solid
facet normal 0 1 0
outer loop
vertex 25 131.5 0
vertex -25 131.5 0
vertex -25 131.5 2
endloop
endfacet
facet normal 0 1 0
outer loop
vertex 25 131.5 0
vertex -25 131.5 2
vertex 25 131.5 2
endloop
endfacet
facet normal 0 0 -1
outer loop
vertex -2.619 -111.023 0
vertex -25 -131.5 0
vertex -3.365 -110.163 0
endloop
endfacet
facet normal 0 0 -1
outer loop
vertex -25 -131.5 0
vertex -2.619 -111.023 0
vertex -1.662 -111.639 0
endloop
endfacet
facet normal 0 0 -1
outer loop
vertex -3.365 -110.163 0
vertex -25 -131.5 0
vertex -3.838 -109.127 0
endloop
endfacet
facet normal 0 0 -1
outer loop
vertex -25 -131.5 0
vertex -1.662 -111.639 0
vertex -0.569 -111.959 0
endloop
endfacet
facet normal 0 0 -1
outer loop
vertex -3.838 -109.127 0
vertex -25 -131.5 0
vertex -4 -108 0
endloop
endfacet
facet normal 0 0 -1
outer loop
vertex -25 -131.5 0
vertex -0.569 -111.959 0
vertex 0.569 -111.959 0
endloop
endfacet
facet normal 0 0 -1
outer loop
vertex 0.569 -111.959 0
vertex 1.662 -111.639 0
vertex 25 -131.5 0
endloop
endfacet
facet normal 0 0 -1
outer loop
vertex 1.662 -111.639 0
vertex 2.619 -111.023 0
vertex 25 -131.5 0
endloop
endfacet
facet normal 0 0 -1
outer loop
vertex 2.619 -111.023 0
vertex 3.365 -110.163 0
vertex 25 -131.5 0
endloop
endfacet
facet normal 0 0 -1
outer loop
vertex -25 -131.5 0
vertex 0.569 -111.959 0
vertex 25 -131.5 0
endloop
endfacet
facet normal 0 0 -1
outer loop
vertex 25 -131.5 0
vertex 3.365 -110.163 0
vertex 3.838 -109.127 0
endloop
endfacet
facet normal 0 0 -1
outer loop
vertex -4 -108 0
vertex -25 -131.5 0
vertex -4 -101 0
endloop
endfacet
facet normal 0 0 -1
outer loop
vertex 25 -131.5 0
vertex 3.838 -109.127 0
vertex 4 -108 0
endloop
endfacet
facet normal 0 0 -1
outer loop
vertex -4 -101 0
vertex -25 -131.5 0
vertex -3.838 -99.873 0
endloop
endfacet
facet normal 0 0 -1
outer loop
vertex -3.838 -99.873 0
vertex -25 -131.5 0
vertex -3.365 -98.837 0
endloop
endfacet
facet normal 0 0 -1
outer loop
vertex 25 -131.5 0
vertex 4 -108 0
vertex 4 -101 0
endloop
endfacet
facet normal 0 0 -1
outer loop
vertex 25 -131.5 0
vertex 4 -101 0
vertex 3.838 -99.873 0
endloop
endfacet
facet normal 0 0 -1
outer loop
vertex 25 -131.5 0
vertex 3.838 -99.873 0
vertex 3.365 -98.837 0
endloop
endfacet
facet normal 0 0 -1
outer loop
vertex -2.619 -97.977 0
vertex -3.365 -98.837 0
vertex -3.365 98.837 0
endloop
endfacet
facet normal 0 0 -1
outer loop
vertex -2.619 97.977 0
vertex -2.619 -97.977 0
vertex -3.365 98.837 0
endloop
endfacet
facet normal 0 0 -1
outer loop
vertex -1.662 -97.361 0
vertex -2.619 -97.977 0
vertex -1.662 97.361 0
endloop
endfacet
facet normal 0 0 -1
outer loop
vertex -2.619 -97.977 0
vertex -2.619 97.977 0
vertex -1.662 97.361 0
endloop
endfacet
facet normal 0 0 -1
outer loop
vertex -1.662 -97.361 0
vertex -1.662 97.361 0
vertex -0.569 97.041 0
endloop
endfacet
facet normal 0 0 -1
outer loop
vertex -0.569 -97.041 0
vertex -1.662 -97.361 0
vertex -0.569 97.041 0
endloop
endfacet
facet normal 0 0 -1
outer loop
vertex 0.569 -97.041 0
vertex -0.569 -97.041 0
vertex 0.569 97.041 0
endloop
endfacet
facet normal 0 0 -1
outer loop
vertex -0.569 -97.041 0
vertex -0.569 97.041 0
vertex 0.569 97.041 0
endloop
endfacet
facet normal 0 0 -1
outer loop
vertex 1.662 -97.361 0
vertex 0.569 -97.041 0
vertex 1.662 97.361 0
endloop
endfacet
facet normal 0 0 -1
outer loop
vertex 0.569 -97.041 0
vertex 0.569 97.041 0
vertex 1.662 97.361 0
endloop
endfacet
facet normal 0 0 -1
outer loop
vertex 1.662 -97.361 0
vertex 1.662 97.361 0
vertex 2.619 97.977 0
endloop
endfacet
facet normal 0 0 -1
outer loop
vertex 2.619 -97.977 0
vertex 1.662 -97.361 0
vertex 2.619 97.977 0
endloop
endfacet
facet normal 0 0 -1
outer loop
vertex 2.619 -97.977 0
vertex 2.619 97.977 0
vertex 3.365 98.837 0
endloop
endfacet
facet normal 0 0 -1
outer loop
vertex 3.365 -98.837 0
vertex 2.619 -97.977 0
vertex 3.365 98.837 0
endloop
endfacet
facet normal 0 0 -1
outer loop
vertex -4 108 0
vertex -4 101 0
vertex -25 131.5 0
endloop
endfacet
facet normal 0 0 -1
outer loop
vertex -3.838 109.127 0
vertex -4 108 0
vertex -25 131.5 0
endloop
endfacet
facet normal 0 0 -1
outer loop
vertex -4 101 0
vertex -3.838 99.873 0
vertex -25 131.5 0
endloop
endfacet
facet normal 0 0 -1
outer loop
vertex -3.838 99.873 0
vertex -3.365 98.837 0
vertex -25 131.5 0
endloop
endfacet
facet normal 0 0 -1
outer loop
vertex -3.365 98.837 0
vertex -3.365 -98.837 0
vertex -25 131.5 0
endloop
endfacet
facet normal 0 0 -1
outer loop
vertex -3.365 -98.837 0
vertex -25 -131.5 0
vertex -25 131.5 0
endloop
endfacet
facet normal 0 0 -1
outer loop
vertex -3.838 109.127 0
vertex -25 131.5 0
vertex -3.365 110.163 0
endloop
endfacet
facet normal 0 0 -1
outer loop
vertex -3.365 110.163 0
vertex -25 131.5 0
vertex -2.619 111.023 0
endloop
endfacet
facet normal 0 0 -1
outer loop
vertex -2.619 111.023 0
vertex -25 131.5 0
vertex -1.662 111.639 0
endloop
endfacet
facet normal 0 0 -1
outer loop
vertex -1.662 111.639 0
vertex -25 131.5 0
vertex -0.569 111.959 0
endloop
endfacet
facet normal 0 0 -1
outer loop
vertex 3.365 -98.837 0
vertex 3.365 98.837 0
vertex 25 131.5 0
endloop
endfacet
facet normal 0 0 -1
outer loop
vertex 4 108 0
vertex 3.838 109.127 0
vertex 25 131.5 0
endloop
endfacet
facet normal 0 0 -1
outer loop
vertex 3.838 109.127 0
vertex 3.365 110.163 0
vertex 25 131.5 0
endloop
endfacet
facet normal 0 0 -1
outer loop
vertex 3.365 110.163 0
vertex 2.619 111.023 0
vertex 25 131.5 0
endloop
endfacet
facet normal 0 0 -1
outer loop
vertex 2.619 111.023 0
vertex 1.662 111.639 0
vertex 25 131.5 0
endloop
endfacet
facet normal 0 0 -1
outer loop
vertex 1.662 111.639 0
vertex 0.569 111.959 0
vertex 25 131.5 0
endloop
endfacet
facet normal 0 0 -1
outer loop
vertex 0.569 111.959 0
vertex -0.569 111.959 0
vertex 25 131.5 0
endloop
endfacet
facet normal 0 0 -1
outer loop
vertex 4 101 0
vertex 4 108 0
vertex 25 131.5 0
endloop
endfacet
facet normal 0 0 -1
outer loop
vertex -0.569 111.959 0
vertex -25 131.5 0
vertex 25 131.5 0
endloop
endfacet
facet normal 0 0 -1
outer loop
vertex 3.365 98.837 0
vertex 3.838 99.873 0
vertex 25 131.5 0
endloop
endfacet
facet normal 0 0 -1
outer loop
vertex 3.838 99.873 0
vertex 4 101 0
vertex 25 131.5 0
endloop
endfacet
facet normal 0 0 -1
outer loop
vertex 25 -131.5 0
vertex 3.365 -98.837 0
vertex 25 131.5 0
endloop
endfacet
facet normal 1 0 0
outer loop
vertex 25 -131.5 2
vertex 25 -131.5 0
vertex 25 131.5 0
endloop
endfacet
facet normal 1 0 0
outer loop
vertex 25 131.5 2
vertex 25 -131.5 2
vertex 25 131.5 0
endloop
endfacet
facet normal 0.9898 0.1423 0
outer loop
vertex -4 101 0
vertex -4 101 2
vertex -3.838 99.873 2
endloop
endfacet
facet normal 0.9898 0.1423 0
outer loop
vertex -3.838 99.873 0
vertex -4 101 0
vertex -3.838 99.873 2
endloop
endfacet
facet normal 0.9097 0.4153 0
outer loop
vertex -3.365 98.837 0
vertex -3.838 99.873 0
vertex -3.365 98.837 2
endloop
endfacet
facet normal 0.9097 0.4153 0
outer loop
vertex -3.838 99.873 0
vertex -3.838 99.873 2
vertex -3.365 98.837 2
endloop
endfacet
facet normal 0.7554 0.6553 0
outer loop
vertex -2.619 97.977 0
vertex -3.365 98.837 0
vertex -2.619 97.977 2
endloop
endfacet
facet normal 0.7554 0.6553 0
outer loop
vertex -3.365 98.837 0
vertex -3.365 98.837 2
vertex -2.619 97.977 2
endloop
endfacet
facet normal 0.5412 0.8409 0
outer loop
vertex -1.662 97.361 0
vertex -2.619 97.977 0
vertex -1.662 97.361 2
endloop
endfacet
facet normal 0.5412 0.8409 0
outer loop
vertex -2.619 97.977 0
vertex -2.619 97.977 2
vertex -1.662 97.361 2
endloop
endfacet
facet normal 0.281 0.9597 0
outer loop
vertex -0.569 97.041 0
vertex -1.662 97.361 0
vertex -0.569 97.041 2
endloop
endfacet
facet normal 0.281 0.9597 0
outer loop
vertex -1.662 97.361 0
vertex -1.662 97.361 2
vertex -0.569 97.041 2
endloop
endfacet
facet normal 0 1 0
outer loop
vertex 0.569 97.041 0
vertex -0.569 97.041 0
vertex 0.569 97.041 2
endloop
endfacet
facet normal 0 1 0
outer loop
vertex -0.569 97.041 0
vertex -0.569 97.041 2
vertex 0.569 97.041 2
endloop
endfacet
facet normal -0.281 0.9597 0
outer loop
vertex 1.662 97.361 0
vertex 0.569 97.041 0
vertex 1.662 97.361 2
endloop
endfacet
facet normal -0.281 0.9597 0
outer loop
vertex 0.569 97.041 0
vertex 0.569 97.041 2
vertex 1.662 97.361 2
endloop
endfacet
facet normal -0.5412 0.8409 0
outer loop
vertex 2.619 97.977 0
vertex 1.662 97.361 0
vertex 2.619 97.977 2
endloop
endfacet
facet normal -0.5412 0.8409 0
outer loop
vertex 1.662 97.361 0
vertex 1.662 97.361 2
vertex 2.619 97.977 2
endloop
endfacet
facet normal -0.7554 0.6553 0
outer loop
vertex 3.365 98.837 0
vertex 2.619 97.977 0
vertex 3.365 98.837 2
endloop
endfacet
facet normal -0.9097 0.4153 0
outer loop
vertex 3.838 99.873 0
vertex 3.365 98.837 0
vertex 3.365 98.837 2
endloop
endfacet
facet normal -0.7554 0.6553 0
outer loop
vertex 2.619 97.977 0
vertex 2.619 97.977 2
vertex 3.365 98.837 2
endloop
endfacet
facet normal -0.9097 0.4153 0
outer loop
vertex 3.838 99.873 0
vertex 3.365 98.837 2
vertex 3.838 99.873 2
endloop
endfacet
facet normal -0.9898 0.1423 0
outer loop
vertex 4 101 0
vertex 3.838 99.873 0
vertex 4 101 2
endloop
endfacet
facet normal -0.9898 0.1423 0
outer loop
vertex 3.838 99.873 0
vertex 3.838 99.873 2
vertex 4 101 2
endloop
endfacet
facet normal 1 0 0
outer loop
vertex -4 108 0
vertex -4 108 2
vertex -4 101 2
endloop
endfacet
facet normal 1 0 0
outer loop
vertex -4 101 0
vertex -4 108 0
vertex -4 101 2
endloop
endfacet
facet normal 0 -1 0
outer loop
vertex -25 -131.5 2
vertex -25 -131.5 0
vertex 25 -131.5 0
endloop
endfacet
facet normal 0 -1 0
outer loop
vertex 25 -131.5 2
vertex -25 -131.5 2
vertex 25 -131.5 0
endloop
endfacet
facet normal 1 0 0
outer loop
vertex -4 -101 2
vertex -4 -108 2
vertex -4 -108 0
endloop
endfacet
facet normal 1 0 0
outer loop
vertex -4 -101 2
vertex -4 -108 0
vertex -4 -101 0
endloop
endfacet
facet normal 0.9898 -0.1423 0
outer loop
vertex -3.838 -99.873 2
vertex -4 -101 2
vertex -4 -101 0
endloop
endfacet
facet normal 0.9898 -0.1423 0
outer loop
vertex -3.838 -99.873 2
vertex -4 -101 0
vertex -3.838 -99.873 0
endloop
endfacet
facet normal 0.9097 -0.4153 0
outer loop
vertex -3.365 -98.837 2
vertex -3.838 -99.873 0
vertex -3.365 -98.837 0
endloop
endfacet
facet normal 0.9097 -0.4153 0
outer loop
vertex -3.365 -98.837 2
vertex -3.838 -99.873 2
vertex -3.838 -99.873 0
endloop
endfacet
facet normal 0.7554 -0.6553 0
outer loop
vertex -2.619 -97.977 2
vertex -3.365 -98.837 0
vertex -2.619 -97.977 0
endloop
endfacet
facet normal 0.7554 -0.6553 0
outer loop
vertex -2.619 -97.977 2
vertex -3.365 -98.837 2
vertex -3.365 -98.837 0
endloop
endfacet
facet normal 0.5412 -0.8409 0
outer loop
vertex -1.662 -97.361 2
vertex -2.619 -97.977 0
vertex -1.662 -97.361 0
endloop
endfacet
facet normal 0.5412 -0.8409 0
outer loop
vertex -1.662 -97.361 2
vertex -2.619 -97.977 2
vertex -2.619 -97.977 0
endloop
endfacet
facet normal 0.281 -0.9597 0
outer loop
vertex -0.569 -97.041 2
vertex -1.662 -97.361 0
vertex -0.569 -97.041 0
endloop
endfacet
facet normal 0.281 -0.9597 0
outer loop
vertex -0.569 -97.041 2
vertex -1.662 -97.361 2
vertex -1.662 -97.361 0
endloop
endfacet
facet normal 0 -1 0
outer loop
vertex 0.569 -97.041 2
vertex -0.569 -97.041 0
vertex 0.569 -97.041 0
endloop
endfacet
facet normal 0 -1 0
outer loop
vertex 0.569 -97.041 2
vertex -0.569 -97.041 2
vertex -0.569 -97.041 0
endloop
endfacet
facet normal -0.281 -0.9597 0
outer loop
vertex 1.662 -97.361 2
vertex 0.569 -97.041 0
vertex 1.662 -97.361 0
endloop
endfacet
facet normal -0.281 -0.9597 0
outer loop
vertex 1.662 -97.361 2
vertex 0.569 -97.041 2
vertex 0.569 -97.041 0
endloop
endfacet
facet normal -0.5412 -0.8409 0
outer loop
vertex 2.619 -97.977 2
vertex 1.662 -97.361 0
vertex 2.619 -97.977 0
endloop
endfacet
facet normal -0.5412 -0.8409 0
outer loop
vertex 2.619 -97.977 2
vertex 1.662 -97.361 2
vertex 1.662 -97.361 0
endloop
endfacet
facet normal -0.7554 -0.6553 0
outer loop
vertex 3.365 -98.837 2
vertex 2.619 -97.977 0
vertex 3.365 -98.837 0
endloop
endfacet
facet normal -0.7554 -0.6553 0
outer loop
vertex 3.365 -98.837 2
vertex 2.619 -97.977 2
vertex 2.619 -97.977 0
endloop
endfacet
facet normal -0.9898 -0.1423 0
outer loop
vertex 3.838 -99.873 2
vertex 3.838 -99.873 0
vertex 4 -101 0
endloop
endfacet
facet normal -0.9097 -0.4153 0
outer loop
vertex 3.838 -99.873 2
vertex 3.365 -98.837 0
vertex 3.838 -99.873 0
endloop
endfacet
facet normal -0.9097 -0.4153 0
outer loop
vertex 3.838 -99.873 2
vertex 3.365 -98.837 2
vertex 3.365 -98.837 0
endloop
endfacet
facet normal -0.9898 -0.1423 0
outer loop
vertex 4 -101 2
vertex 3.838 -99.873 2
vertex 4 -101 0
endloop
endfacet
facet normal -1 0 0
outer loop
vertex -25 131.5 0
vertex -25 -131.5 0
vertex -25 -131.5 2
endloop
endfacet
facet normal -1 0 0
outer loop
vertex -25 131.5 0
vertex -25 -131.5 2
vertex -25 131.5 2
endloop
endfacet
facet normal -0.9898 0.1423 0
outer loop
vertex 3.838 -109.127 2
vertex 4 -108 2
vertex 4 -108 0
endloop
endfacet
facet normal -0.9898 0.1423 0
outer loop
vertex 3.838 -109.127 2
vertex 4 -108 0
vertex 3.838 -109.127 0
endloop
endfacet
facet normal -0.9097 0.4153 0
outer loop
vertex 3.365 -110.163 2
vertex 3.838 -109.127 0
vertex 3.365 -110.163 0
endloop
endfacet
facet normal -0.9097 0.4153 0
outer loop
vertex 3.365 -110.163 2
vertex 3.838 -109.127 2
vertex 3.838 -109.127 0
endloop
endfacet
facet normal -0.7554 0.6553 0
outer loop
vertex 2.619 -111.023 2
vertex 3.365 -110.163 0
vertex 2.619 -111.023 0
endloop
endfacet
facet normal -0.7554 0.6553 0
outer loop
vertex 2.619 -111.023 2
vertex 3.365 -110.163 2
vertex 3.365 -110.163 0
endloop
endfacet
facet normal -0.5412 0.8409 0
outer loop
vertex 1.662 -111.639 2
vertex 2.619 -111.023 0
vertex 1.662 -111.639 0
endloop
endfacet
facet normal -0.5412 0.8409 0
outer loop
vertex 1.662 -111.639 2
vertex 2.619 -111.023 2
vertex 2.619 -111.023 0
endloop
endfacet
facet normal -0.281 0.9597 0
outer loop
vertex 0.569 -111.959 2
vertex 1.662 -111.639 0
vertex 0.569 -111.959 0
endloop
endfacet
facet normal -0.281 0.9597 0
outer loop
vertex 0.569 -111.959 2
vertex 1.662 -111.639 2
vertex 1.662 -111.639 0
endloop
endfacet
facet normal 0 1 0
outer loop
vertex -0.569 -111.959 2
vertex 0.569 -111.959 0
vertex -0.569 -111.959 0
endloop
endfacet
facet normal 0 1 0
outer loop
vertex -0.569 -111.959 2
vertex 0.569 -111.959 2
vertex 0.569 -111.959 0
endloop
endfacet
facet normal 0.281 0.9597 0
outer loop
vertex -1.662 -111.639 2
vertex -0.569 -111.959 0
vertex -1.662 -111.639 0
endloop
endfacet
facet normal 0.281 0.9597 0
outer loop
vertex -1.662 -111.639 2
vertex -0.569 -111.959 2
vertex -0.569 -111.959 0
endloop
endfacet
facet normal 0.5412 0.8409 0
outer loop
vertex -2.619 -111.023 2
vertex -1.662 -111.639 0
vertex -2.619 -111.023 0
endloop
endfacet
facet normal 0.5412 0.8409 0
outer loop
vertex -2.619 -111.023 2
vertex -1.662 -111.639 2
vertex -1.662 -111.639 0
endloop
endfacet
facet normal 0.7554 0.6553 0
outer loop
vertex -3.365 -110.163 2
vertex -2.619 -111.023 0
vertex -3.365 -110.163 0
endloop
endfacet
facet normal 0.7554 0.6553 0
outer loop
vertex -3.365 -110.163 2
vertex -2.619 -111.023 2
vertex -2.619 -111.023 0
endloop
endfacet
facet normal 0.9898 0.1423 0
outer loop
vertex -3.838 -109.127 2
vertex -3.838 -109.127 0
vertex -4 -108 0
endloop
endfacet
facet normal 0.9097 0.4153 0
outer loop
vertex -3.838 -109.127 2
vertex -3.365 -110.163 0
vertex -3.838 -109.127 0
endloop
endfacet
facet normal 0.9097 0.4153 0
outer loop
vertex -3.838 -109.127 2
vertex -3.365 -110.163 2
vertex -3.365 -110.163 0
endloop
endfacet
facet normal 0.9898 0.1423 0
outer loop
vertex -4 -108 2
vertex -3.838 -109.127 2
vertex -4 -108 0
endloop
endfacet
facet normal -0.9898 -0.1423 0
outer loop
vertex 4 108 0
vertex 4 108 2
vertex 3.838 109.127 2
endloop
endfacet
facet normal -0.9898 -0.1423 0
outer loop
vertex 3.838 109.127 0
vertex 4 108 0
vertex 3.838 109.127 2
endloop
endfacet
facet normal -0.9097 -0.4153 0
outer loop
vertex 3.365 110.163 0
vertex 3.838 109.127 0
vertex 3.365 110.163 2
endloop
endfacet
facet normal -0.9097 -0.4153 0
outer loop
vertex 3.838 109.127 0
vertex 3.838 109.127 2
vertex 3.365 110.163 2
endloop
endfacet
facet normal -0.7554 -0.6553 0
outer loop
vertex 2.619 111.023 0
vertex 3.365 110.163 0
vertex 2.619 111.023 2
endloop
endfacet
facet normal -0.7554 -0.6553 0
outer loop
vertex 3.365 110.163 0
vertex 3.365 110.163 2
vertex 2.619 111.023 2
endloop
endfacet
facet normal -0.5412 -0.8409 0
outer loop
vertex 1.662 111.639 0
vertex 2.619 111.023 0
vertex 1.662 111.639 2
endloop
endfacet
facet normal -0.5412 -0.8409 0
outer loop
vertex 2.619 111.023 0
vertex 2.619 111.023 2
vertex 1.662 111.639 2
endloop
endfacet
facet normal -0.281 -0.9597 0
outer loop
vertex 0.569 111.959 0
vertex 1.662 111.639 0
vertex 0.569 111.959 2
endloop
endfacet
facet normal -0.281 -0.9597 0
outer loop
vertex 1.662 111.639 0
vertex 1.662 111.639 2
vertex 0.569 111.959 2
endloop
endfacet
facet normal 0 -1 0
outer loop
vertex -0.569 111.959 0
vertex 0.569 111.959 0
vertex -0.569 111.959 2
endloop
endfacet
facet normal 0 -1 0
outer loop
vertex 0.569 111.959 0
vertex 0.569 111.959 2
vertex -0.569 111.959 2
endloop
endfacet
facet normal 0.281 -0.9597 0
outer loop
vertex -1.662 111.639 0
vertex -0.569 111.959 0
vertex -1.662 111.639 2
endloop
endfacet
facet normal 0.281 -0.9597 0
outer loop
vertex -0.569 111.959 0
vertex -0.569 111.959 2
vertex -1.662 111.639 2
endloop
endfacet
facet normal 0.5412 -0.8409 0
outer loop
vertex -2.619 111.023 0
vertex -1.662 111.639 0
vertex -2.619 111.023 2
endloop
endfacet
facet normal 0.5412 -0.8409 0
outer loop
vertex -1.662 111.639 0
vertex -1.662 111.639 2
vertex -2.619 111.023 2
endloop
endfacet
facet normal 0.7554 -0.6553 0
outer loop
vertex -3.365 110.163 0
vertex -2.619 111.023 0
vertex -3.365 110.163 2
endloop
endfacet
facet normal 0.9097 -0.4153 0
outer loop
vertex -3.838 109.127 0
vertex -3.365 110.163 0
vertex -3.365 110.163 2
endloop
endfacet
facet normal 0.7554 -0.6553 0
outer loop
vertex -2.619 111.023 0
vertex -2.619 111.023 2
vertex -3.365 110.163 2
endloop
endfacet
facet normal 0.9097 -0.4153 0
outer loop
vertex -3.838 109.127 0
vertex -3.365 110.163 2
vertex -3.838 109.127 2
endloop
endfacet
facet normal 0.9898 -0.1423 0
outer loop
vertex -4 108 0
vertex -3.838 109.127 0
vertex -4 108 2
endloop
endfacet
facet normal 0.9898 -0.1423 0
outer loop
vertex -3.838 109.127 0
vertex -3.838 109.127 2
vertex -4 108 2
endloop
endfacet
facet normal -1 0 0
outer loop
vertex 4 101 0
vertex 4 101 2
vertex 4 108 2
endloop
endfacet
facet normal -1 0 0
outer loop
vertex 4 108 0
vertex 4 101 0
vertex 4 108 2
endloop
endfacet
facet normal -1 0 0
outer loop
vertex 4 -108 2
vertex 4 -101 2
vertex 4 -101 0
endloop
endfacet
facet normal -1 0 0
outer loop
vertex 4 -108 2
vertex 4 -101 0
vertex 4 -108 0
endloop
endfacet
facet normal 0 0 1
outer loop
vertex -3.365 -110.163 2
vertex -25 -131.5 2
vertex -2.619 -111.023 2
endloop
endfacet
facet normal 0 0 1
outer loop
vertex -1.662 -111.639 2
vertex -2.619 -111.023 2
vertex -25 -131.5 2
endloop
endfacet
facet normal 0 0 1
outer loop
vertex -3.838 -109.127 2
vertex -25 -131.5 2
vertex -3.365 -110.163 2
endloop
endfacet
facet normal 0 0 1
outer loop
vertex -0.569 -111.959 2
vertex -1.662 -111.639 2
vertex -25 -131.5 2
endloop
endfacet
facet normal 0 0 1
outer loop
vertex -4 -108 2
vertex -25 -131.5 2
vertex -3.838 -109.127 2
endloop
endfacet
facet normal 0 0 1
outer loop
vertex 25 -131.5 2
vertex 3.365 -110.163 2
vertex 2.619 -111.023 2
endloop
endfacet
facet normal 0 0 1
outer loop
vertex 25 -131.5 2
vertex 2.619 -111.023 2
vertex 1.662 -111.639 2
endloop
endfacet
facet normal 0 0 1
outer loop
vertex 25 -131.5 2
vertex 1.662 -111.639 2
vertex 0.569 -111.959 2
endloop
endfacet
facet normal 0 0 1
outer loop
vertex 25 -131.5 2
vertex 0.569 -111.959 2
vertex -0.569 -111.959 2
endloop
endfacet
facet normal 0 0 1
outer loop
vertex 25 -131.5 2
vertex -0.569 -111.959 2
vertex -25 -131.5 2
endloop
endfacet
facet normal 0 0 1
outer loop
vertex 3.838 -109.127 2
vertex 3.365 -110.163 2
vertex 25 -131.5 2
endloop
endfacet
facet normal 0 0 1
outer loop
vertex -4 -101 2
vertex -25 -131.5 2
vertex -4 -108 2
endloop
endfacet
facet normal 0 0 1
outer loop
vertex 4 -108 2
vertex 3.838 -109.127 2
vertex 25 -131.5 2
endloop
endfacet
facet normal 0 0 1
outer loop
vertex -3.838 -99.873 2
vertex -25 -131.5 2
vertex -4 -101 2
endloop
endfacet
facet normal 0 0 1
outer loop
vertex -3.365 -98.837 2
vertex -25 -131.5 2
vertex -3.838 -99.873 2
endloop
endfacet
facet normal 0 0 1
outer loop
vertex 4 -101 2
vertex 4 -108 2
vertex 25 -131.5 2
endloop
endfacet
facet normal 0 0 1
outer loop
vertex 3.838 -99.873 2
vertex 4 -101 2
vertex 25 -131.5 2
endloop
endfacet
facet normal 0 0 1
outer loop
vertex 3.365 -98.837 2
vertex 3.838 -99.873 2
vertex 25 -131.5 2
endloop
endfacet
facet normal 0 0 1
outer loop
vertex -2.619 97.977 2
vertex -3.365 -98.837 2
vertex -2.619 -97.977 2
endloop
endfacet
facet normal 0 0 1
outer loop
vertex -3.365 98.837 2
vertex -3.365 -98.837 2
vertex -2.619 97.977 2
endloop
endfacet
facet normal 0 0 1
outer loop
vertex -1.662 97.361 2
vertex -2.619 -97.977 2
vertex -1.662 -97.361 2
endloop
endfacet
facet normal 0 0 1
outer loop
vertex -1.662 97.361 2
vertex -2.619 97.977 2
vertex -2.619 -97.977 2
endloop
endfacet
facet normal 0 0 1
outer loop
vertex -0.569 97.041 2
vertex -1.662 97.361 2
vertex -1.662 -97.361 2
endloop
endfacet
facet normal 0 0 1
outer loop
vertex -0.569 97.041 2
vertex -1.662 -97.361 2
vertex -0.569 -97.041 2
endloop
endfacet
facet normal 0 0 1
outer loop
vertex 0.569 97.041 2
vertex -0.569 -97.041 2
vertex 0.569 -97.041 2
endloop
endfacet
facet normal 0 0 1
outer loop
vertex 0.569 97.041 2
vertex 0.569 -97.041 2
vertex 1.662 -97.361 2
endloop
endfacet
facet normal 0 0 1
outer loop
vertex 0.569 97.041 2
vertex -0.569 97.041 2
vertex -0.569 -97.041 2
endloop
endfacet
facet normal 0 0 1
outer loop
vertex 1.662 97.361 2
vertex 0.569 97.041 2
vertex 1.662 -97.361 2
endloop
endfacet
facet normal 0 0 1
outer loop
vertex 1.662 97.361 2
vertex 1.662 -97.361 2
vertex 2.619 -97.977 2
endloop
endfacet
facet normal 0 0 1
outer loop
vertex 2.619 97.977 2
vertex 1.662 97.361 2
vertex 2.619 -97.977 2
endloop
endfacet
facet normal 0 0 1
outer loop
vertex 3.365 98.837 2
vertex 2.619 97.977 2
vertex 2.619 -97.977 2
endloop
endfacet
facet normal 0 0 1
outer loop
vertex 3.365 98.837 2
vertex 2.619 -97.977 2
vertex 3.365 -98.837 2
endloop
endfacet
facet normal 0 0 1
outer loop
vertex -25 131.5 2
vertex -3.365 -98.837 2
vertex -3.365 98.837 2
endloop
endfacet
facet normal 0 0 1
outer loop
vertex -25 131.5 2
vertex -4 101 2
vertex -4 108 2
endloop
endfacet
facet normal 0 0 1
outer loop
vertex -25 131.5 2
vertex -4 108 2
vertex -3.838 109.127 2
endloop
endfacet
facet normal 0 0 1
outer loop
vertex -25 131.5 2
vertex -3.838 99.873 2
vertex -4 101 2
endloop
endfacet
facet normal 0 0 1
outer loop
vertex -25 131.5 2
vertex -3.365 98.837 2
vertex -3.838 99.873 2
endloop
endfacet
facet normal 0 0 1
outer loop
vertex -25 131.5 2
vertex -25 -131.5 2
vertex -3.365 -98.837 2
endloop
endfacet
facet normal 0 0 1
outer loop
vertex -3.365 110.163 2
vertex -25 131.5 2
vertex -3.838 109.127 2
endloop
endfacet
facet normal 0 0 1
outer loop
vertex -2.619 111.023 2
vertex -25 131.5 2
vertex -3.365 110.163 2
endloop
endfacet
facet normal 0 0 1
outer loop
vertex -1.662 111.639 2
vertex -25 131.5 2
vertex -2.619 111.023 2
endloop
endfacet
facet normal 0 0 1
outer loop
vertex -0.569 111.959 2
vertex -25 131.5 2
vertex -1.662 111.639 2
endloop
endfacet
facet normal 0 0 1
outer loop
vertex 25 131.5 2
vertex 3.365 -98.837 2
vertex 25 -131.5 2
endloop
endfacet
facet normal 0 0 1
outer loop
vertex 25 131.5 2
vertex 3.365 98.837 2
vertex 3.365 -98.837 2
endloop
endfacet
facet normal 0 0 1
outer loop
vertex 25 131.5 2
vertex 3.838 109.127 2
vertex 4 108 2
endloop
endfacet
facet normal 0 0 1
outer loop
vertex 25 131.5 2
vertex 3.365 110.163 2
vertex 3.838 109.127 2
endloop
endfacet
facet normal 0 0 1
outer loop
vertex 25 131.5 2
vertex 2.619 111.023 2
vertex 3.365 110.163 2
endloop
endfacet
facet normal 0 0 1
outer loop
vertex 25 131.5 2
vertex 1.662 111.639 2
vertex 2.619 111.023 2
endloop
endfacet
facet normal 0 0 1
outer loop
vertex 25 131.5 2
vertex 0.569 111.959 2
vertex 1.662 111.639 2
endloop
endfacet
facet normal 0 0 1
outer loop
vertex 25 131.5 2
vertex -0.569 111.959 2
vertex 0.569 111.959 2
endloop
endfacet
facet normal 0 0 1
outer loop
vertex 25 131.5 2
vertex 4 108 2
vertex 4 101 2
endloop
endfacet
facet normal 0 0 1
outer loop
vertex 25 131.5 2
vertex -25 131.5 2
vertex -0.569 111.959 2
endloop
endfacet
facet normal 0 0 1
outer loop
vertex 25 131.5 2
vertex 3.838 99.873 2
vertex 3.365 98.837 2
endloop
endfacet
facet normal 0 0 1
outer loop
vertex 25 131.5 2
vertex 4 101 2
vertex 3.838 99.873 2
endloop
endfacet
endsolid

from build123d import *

# Parameters (mm, degrees)
SKETCH1_W           = 50
SKETCH1_H           = 263
BOSS_EXTRUDE1_DEPTH = 2
CUT_EXTRUDE1_DEPTH  = 134.870273026


with BuildPart() as part:
    # Sketch1 → Boss-Extrude1 (new body)
    with BuildSketch(Plane.XY):
        Rectangle(SKETCH1_W, SKETCH1_H)
    extrude(amount=BOSS_EXTRUDE1_DEPTH)

    # Sketch2 → Cut-Extrude1 (cut, through all)
    with BuildSketch(Plane.XY.offset(2)):
        with BuildLine():
            Line((-4, -108), (-4, -101))
            ThreePointArc((-4, -101), (0, -97), (4, -101))
            Line((4, -101), (4, -108))
            ThreePointArc((4, -108), (0, -112), (-4, -108))
        make_face()
        with BuildLine():
            Line((-4, 108), (-4, 101))
            ThreePointArc((-4, 101), (0, 97), (4, 101))
            Line((4, 101), (4, 108))
            ThreePointArc((4, 108), (0, 112), (-4, 108))
        make_face()
    extrude(amount=-CUT_EXTRUDE1_DEPTH, mode=Mode.SUBTRACT)


solid = part.part
